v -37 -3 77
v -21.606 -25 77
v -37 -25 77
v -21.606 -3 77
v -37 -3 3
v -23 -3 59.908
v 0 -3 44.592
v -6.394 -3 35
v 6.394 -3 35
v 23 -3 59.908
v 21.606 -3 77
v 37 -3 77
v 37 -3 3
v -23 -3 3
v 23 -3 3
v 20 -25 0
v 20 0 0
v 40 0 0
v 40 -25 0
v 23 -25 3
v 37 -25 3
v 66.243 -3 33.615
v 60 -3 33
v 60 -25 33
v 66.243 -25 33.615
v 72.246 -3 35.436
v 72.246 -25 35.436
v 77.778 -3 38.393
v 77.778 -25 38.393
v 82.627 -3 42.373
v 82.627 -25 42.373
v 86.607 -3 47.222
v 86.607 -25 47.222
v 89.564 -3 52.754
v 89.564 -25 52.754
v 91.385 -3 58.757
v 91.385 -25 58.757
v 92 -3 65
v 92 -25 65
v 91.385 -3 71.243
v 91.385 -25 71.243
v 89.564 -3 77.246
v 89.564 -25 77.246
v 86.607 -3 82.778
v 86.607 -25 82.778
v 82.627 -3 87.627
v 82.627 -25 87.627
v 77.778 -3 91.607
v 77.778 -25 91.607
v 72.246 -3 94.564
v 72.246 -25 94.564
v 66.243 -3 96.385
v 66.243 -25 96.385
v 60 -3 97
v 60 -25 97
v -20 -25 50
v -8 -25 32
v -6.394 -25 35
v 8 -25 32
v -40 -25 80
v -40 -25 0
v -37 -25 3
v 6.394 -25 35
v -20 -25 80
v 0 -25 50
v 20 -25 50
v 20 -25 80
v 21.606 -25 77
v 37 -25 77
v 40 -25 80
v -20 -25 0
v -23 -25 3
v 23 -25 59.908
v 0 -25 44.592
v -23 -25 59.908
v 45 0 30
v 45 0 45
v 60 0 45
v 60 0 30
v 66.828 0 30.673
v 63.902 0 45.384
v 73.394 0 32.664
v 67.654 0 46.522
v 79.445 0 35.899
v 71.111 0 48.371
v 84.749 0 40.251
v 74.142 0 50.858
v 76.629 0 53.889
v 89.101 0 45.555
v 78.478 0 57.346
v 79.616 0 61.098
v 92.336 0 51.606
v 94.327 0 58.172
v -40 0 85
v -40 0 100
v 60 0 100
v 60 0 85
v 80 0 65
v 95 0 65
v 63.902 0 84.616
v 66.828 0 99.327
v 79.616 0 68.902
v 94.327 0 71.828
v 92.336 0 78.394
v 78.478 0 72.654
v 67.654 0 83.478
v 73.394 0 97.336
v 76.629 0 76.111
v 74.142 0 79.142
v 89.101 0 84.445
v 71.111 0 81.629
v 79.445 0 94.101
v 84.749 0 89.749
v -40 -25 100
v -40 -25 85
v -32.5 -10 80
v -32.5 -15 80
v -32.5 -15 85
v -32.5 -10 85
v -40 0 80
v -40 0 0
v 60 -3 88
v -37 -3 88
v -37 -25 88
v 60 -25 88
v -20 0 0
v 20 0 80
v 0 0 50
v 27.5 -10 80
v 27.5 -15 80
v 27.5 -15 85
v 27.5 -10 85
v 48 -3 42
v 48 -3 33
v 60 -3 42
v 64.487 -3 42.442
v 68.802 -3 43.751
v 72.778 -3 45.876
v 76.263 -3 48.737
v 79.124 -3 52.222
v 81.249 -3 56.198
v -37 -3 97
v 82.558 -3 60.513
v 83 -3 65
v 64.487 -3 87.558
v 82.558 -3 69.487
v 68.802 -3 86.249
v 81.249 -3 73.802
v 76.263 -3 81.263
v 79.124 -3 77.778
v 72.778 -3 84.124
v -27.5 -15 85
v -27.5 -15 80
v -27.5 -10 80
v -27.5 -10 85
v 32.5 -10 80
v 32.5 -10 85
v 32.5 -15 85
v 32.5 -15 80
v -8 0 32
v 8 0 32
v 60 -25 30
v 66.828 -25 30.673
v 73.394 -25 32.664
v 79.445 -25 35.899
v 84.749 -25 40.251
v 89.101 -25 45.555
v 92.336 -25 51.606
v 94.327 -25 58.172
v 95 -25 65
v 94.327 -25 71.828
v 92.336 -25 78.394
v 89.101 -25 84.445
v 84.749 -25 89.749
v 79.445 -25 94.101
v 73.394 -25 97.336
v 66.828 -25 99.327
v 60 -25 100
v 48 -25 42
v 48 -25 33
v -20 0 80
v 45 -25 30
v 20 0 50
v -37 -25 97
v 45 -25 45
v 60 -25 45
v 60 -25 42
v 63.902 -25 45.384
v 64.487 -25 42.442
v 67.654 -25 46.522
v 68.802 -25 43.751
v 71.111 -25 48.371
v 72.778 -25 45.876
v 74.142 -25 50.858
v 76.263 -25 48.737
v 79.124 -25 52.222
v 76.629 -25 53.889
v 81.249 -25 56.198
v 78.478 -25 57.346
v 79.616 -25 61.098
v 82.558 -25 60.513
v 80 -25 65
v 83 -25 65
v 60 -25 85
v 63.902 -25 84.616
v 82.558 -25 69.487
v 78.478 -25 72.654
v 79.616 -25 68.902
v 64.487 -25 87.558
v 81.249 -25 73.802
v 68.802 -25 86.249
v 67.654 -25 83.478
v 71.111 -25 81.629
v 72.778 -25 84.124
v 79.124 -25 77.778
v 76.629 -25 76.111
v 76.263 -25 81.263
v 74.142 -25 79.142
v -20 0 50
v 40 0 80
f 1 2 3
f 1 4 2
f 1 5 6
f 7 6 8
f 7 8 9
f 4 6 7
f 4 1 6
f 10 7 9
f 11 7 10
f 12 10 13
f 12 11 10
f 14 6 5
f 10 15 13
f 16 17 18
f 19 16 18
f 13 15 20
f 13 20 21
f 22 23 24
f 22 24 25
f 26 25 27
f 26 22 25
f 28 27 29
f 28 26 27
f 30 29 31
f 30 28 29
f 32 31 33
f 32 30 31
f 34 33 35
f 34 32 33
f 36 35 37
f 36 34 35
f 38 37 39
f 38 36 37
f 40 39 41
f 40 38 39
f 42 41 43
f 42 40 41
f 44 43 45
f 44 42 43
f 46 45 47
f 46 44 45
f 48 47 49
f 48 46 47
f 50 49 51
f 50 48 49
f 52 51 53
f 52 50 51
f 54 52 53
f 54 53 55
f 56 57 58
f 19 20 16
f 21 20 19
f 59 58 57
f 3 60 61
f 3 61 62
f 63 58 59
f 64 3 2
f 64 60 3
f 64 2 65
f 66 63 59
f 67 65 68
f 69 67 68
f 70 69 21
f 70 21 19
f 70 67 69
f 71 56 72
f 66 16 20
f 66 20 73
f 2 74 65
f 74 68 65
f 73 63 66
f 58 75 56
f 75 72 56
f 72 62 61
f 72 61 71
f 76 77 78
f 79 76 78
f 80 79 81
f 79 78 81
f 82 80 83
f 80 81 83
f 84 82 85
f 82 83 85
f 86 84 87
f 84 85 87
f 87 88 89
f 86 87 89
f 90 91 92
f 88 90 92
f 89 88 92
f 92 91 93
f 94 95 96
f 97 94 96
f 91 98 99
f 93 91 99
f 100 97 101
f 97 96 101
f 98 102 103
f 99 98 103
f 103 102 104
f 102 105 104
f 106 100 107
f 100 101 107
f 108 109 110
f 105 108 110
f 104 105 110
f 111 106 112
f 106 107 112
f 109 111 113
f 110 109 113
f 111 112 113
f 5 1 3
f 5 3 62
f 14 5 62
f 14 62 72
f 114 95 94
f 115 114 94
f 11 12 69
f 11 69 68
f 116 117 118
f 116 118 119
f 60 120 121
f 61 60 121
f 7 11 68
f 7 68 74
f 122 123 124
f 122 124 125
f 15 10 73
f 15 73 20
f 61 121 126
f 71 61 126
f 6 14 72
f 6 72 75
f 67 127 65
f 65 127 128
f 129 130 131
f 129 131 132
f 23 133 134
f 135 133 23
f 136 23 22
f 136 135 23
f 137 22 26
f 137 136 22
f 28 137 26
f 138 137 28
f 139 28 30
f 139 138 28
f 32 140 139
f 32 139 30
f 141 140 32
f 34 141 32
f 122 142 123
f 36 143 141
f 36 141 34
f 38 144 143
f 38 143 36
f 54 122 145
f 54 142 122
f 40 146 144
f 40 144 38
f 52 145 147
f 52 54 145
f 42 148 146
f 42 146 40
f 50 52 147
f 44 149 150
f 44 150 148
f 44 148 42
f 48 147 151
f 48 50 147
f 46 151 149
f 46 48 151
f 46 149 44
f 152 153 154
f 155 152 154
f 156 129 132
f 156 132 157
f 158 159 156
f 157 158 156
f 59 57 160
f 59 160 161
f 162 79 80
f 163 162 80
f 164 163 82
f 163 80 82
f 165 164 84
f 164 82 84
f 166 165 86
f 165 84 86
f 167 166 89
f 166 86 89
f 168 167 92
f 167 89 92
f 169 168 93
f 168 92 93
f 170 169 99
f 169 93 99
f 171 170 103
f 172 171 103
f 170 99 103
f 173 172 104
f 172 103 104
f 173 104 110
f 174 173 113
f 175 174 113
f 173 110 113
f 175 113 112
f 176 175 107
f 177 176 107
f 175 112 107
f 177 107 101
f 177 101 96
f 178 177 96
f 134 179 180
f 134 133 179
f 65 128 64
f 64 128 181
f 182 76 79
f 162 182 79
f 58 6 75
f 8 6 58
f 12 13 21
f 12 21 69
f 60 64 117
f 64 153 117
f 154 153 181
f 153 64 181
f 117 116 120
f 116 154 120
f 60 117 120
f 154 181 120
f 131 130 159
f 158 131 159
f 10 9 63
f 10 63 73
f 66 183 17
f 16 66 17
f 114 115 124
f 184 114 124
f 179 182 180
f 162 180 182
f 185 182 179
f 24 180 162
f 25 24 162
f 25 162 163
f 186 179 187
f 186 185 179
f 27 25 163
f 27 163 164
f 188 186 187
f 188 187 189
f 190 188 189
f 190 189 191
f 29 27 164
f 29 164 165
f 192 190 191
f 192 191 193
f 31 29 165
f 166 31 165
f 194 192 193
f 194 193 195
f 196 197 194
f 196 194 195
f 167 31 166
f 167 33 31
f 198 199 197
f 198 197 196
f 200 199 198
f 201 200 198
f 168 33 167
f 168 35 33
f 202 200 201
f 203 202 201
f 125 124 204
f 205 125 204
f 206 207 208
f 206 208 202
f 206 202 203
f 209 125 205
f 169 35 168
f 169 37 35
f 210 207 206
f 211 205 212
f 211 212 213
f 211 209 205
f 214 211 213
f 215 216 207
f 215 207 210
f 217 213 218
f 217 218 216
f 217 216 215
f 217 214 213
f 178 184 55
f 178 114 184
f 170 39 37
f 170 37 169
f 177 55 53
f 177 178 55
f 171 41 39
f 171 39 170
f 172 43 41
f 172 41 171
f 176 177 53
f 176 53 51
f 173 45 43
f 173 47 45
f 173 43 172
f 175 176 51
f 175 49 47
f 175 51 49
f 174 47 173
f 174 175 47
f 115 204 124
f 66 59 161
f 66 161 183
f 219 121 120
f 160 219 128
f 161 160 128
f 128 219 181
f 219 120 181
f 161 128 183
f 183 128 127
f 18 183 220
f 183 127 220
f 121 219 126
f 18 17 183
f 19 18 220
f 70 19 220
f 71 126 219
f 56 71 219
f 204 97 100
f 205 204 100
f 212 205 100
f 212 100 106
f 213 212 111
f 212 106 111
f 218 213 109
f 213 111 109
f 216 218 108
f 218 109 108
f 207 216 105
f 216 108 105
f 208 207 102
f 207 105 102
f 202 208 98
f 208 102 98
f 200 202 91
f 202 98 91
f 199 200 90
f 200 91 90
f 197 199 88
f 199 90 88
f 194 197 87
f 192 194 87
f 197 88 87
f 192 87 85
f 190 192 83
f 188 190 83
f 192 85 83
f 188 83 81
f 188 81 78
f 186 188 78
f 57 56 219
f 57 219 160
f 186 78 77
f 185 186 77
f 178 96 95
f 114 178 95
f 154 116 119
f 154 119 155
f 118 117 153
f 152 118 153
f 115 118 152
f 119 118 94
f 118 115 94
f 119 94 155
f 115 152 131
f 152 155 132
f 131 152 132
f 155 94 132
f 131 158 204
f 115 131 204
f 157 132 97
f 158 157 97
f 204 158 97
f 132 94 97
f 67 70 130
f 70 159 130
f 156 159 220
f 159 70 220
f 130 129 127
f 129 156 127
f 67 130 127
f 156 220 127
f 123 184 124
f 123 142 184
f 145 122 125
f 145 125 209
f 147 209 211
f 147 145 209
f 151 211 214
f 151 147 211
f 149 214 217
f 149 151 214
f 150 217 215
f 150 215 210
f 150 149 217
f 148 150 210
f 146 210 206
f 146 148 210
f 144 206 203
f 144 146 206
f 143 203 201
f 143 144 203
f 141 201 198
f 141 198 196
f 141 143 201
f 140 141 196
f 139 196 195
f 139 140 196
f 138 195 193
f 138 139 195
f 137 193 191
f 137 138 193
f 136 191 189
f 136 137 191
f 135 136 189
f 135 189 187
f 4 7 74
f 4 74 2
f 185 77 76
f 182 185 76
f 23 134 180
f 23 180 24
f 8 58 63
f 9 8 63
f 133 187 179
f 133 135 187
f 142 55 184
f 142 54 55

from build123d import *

# Parameters (mm, degrees)
F3_DEPTH = 25
F4_T     = -3
F4_2_T   = -3
F5_W     = 5
F5_H     = 5
F6_DEPTH = 5


with BuildPart() as f3:
    # F1 (on Front) → F3 (new body)
    with BuildSketch(Plane.XZ):
        Polygon((-40, 80), (-40, 0), (-20, 0), (-20, 50), (-8, 32), (0, 32), (8, 32), (20, 50), (20, 0), (40, 0), (40, 80), (20, 80), (0, 50), (-20, 80), align=None)
    extrude(amount=F3_DEPTH)

    # F4
    f4_openings = [f3.faces().sort_by_distance(p)[0] for p in [
        (0, -25, 43.055762),
    ]]
    offset(amount=F4_T, openings=f4_openings, kind=Kind.INTERSECTION)



with BuildPart() as f3b:
    # F2 (on Front) → F3, piece 2 (new body)
    with BuildSketch(Plane.XZ):
        with BuildLine():
            Line((-40, 100), (-40, 85))
            Line((-40, 85), (60, 85))
            ThreePointArc((60, 85), (80, 65), (60, 45))
            Line((60, 45), (45, 45))
            Line((45, 45), (45, 30))
            Line((45, 30), (60, 30))
            ThreePointArc((60, 30), (95, 65), (60, 100))
            Line((60, 100), (-40, 100))
        make_face()
    extrude(amount=F3_DEPTH)

    # F4#2
    f4_2_openings = [f3b.faces().sort_by_distance(p)[0] for p in [
        (-38.479309, -25, 92.5),
    ]]
    offset(amount=F4_2_T, openings=f4_2_openings)


with BuildPart() as f3_1:
    add(f3.part)

    add(f3b.part)  # F6 merges F3b
    # F5 (on offset) → F6 (join)
    with BuildSketch(Plane.XY.offset(80)):
        with Locations((-30, -12.5)):
            Rectangle(F5_W, F5_H)
        with Locations((30, -12.5)):
            Rectangle(F5_W, F5_H)
    extrude(amount=F6_DEPTH)


solid = f3_1.part
